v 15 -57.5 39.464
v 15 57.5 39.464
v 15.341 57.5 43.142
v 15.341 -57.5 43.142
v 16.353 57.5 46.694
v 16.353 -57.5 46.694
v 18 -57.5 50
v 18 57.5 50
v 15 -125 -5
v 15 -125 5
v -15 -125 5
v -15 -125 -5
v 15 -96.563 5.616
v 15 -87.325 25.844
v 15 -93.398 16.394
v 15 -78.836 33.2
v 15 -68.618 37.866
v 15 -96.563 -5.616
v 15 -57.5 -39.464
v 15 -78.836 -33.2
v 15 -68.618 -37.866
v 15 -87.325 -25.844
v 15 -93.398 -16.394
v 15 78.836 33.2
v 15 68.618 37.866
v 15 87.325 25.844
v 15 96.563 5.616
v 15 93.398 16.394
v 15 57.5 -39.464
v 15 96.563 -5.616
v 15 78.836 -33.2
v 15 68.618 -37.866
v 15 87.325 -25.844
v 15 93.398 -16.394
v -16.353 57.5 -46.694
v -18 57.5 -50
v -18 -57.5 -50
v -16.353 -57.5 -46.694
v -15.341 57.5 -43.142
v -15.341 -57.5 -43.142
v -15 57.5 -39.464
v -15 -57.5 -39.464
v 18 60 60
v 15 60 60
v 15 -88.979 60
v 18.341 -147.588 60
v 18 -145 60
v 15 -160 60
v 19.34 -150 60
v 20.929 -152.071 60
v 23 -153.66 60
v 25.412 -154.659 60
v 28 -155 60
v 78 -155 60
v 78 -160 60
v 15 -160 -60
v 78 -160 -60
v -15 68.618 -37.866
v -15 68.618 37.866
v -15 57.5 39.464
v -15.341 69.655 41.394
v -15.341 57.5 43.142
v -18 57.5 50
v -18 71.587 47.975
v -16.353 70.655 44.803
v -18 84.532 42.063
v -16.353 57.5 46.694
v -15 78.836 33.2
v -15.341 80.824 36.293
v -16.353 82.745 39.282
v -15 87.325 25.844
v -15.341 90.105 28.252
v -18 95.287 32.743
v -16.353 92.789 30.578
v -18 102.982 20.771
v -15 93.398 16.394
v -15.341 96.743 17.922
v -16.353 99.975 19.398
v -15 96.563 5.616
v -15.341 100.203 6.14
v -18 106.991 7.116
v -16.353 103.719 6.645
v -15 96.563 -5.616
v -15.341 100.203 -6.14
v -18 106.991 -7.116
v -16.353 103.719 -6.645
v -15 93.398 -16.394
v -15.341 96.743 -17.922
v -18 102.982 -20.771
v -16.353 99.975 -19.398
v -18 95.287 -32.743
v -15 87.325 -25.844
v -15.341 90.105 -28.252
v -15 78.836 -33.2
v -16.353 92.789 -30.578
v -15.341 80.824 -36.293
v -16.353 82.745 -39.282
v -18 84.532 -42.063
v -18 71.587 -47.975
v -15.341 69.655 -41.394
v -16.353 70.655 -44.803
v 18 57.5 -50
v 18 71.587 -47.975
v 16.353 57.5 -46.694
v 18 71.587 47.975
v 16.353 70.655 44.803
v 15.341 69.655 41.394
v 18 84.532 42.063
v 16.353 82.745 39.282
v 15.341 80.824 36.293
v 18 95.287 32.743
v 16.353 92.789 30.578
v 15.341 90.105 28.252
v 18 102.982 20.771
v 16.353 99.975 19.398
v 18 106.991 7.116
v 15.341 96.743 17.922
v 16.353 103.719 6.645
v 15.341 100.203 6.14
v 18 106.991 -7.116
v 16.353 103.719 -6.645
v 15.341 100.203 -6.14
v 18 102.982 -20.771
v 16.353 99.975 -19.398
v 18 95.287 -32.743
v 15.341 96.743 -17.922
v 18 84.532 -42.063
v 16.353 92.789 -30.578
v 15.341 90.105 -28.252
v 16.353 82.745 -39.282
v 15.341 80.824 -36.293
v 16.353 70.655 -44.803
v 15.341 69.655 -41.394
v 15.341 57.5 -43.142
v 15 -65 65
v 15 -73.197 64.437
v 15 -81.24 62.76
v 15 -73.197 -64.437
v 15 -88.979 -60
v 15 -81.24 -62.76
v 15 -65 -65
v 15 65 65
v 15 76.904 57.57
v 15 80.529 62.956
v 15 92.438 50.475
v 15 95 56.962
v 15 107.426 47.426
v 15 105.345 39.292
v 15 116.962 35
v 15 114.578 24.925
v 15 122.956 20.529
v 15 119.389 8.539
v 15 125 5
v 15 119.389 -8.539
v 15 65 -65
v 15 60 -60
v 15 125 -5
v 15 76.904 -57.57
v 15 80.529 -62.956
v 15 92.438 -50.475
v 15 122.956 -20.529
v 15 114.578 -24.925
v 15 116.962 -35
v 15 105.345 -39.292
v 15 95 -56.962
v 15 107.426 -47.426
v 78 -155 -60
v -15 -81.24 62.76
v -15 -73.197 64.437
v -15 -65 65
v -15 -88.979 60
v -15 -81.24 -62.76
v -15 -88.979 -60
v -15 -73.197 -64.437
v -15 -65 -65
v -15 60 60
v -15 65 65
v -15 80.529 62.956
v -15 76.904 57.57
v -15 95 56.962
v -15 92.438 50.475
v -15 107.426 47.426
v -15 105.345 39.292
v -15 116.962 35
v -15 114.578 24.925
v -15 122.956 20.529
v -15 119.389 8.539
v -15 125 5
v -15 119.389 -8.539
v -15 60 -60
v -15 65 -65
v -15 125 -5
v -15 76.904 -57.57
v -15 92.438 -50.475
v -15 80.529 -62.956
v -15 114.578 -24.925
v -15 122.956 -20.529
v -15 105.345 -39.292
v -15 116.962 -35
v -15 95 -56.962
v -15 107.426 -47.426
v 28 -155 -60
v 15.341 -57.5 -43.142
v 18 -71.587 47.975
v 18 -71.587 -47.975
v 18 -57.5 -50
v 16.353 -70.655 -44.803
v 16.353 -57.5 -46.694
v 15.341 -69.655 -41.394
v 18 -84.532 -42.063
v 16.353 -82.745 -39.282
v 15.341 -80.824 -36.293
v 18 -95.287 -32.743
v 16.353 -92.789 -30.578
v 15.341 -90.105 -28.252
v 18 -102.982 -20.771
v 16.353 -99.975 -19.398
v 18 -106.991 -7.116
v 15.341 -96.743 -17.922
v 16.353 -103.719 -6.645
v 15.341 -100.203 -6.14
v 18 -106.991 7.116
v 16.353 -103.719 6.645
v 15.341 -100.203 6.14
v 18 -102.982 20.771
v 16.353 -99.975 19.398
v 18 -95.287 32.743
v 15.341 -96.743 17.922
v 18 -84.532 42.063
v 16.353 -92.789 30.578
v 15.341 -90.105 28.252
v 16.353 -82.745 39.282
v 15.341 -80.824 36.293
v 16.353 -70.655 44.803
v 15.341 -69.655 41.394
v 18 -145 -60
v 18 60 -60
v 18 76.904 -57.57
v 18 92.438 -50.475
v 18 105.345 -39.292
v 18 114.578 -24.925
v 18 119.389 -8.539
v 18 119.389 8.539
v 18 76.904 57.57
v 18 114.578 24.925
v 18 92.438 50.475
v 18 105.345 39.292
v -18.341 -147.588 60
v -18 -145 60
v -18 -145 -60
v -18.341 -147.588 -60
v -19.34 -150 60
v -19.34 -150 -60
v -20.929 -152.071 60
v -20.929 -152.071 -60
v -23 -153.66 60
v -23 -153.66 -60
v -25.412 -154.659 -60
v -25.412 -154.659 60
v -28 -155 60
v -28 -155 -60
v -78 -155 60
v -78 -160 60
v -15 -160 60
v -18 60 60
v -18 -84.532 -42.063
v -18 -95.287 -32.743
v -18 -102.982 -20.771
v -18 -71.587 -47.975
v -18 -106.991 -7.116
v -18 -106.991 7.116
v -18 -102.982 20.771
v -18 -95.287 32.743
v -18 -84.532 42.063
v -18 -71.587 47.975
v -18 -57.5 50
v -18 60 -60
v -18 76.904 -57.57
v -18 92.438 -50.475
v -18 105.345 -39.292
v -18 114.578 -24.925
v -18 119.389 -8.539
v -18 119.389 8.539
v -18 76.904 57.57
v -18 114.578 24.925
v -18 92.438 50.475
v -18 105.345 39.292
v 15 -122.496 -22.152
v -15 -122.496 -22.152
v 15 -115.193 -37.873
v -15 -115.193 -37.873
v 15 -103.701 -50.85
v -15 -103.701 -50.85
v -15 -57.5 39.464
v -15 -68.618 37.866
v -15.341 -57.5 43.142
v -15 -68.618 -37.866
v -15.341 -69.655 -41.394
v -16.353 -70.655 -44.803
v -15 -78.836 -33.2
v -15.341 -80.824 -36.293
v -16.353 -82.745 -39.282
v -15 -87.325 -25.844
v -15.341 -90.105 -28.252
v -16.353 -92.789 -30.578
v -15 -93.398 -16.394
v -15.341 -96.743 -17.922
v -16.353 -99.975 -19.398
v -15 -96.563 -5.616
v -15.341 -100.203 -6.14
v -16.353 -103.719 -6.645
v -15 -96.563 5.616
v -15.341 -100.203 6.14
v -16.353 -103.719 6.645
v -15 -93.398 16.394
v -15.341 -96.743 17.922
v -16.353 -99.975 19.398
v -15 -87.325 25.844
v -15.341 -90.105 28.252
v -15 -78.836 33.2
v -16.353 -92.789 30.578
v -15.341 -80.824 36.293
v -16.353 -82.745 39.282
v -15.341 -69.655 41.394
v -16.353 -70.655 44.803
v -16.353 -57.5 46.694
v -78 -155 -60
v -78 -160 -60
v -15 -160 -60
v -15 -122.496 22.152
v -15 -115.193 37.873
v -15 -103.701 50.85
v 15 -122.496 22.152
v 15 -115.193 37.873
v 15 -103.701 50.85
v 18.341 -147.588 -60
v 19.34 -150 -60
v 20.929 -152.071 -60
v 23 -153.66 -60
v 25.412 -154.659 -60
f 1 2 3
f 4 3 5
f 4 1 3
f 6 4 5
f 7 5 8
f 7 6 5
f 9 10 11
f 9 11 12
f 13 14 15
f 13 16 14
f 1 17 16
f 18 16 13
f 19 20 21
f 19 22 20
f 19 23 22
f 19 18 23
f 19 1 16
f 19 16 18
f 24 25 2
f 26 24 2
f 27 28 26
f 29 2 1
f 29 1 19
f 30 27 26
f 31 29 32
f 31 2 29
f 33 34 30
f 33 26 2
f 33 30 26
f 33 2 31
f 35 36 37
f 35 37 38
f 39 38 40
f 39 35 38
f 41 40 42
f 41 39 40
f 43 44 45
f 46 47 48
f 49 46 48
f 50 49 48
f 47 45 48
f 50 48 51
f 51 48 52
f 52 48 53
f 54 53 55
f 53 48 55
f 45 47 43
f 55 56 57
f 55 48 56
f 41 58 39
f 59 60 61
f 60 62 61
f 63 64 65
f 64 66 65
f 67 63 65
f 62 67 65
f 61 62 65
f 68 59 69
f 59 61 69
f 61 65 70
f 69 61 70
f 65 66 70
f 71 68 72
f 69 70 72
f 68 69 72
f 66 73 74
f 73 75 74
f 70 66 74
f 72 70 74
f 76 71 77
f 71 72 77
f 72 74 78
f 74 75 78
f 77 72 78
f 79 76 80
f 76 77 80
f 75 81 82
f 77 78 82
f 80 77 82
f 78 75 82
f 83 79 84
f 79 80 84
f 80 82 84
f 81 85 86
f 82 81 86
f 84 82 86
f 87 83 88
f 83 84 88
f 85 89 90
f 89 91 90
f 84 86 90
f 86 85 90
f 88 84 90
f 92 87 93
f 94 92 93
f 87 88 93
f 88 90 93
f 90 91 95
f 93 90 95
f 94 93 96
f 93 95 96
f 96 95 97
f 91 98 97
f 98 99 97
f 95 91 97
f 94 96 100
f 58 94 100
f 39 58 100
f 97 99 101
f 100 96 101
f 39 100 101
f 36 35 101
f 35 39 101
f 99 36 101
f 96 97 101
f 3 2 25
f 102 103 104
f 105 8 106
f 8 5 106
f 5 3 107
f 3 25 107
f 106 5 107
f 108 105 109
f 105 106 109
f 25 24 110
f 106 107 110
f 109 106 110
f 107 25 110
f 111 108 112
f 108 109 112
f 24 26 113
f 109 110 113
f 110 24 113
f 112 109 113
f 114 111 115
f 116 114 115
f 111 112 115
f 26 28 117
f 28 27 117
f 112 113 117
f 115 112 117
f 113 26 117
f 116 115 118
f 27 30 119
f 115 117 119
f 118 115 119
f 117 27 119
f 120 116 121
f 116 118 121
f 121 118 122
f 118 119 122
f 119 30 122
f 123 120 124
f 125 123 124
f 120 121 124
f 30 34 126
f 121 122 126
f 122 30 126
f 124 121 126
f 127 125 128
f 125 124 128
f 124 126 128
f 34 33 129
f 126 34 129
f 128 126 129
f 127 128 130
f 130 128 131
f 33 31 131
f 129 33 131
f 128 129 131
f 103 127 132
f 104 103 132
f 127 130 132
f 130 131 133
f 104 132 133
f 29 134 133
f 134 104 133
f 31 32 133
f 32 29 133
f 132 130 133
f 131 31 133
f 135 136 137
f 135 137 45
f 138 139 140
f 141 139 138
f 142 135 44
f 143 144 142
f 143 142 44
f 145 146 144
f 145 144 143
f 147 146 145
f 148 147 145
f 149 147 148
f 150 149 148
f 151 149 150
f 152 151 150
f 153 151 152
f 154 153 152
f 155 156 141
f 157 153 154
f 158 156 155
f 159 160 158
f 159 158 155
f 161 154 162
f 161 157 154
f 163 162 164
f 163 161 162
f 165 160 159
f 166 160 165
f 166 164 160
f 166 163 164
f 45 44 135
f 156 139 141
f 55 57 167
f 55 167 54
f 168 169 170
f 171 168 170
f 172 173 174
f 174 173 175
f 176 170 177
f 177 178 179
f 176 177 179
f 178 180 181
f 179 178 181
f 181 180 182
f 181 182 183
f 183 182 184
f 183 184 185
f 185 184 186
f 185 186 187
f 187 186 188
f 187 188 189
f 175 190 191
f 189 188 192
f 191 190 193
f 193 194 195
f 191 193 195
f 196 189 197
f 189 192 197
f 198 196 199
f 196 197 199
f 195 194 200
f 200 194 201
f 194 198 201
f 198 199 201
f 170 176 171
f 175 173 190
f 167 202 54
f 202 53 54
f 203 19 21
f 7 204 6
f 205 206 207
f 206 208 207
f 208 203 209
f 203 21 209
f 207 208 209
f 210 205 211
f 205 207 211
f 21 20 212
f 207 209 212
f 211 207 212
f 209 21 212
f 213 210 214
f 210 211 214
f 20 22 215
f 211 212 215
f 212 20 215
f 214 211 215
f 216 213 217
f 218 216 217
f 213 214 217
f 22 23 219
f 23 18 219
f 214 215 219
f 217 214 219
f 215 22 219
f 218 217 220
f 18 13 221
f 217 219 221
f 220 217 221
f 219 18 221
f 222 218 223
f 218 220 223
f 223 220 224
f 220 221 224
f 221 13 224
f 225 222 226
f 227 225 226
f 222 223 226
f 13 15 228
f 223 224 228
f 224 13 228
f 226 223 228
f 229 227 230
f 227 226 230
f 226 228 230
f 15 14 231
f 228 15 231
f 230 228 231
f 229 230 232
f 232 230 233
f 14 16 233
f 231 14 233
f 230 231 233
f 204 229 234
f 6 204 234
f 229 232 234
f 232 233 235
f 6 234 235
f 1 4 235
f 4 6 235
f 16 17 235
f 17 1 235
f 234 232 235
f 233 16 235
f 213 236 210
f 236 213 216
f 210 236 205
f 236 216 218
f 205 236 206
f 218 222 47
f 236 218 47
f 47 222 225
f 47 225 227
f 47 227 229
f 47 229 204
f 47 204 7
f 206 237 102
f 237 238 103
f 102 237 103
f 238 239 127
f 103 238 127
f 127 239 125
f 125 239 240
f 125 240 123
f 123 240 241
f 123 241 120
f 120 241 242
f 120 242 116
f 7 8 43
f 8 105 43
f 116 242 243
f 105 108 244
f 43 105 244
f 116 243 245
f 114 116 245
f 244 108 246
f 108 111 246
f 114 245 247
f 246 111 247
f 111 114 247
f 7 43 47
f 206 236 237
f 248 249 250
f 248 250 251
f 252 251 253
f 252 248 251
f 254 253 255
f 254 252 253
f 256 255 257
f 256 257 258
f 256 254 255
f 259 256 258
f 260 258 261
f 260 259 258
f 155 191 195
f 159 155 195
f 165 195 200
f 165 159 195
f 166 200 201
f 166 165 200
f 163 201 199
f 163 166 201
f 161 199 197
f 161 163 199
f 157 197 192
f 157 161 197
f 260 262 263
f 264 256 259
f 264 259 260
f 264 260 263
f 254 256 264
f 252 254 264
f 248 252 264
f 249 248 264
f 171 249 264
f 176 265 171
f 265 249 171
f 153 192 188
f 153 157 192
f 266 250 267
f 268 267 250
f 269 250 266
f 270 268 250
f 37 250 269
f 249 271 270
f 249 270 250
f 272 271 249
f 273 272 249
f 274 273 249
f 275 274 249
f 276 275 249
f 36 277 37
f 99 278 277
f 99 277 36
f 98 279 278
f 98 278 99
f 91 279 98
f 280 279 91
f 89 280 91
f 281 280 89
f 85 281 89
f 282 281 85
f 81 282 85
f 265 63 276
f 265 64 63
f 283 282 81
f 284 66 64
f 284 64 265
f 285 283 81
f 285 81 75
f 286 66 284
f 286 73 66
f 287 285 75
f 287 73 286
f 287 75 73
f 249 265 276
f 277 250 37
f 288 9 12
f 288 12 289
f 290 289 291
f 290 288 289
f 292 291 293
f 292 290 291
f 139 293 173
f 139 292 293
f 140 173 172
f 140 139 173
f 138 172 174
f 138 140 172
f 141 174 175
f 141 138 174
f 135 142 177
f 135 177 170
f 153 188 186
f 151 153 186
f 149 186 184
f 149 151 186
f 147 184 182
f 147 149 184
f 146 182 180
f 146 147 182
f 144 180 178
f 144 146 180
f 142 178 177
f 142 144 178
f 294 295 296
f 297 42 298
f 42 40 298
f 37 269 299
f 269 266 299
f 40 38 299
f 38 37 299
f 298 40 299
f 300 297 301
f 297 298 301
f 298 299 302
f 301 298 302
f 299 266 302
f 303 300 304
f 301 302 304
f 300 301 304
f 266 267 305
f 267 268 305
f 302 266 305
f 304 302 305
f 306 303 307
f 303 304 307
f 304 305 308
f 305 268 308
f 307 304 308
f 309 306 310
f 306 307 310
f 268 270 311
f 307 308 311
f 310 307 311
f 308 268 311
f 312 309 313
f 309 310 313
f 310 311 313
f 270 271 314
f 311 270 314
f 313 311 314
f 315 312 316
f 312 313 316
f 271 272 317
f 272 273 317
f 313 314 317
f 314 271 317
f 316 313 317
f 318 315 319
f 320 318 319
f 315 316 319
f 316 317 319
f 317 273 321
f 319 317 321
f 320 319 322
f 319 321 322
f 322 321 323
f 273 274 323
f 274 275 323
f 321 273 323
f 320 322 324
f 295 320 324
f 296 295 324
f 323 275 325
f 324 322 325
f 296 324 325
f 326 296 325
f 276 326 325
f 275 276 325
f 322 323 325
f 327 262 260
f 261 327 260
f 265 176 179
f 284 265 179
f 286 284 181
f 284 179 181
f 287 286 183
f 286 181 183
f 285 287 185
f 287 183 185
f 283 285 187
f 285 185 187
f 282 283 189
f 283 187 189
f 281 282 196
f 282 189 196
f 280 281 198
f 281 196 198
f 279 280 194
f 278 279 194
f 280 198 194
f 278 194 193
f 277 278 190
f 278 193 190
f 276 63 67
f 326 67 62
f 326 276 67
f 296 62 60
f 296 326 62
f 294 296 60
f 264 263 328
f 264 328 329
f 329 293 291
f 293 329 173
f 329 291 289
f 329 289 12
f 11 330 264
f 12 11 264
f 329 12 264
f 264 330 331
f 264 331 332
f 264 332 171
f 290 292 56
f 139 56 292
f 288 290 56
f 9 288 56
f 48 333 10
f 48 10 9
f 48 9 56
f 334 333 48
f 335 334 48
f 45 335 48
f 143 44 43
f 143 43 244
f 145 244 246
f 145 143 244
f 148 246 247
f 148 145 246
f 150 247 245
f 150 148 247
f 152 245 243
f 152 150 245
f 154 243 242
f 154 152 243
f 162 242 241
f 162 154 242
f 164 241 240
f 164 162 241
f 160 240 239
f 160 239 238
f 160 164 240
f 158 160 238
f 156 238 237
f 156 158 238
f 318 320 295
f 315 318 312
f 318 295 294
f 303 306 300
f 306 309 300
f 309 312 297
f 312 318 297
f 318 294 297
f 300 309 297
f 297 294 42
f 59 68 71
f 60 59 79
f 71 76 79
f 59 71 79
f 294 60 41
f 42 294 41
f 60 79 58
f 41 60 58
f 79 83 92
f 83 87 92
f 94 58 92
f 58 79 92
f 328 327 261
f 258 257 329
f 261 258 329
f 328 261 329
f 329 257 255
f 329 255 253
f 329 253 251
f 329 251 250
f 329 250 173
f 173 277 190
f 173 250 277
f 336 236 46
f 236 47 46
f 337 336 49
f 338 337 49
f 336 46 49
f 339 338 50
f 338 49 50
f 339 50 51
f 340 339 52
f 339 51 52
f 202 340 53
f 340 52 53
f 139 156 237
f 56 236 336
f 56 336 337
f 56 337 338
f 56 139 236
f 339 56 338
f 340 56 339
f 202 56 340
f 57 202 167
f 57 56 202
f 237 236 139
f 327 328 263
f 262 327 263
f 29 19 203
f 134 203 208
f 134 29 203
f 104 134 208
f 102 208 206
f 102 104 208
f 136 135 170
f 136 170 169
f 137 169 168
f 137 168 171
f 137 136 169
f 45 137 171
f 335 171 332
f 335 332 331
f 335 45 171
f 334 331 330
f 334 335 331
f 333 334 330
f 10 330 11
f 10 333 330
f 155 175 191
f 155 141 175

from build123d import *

# Parameters (mm, degrees)
BOSS_EXTRUDE1_DEPTH = 15
BOSS_EXTRUDE2_DEPTH = 3
FILLET1_R           = 20
SKETCH4_W           = 60
SKETCH4_H           = 120
BOSS_EXTRUDE3_DEPTH = 5
BOSS_EXTRUDE4_START = -30
BOSS_EXTRUDE4_DEPTH = 3
FILLET2_R           = 20
FILLET4_R           = 10
BOSS_EXTRUDE5_START = -5
BOSS_EXTRUDE5_DEPTH = 120


with BuildPart() as part:
    # Sketch1 → Boss-Extrude1 (new, symmetric)
    with BuildSketch(Plane(origin=(0, 0, 0), x_dir=(0, 0, -1), z_dir=(1, 0, 0))):
        with BuildLine():
            Line((5, 125), (-5, 125))
            ThreePointArc((-5, 125), (-47.426406871, 107.426406871), (-65, 65))
            Line((-65, 65), (-65, -65))
            ThreePointArc((-65, -65), (-47.426406871, -107.426406871), (-5, -125))
            Line((-5, -125), (5, -125))
            ThreePointArc((5, -125), (47.426406871, -107.426406871), (65, -65))
            Line((65, -65), (65, 65))
            ThreePointArc((65, 65), (47.426406871, 107.426406871), (5, 125))
        make_face()
    extrude(amount=BOSS_EXTRUDE1_DEPTH, both=True)

    # Sketch3 → Boss-Extrude2 (add)
    with BuildSketch(Plane(origin=(15, 0, 0), x_dir=(0, 0, -1), z_dir=(1, 0, 0))):
        with BuildLine():
            Line((-60, -60), (-60, 60))
            ThreePointArc((-60, 60), (0, 120), (60, 60))
            Line((60, 60), (60, -60))
            Line((60, -60), (60, -160))
            Line((60, -160), (-60, -160))
            Line((-60, -160), (-60, -60))
        make_face()
        with BuildLine():
            Line((-50, -57.5), (-50, 57.5))
            ThreePointArc((-50, 57.5), (0, 107.5), (50, 57.5))
            Line((50, 57.5), (50, -57.5))
            ThreePointArc((50, -57.5), (0, -107.5), (-50, -57.5))
        make_face(mode=Mode.SUBTRACT)
    extrude(amount=BOSS_EXTRUDE2_DEPTH)

    # Fillet1
    # the kernel refuses this fillet: 20 mm, written as the material it adds along each edge
    with BuildSketch(Plane(origin=(15, 57.5, -50), x_dir=(1, 0, 0), z_dir=(0, -1, 0)), Plane(origin=(15, -57.5, 50), x_dir=(1, 0, 0), z_dir=(0, 1, 0))) as fillet1_piece_1:
        with BuildLine():
            CenterArc((20, 10.535653753), FILLET1_R, 180, 31.788330617)
            Line((0, 10.535653753), (-0.4, 10.535653753))
            Line((-0.4, 10.535653753), (-0.4, 0))
            Line((-0.4, 0), (0, -0.4))
            ThreePointArc((0, -0.4), (1.5, -0.4), (2.66, -0.210713075))
            Line((2.66, -0.210713075), (3, 0))
        make_face()
    extrude(amount=115)
    with BuildSketch(Plane(origin=(15, -57.5, 0), x_dir=(0, 0, -1), z_dir=(0, 1, 0))) as fillet1_piece_2:
        with BuildLine():
            CenterArc((39.464346247, -20), FILLET1_R, 58.211669383, 31.788330617)
            Line((39.464346247, 0), (39.464346247, 0.4))
            Line((39.464346247, 0.4), (50, 0.4))
            Line((50, 0.4), (50.4, 0))
            ThreePointArc((50.4, 0), (50.4, -1.5), (50.210713075, -2.66))
            Line((50.210713075, -2.66), (50, -3))
        make_face()
    revolve(axis=Axis((15, -57.5, 0), (-1, 0, 0)), revolution_arc=180)
    with BuildSketch(Plane(origin=(15, 57.5, 0), x_dir=(0, 0, 1), z_dir=(0, -1, 0))) as fillet1_piece_3:
        with BuildLine():
            CenterArc((39.464346247, -20), FILLET1_R, 58.211669383, 31.788330617)
            Line((39.464346247, 0), (39.464346247, 0.4))
            Line((39.464346247, 0.4), (50, 0.4))
            Line((50, 0.4), (50.4, 0))
            ThreePointArc((50.4, 0), (50.4, -1.5), (50.210713075, -2.66))
            Line((50.210713075, -2.66), (50, -3))
        make_face()
    revolve(axis=Axis((15, 57.5, 0), (-1, 0, 0)), revolution_arc=180)

    # Sketch4 → Boss-Extrude3 (add)
    with BuildSketch(Plane.XZ.offset(160)):
        with Locations((48, 0)):
            Rectangle(SKETCH4_W, SKETCH4_H)
        with Locations((-48, 0)):
            Rectangle(SKETCH4_W, SKETCH4_H)
    extrude(amount=-BOSS_EXTRUDE3_DEPTH)


with BuildPart() as boss_extrude3_piece_1:
    # of the separate pieces the step leaves, piece 1, a body of its own (boss_extrude3_pieces)
    add(part.part.solids().sort_by_distance((18, 57.5, 50))[0])

    # Sketch3<4> → Boss-Extrude4 (add)
    with BuildSketch(Plane(origin=(15, 0, 0), x_dir=(0, 0, -1), z_dir=(1, 0, 0)).offset(BOSS_EXTRUDE4_START)):
        with BuildLine():
            Line((-60, -60), (-60, 60))
            ThreePointArc((-60, 60), (0, 120), (60, 60))
            Line((60, 60), (60, -60))
            Line((60, -60), (60, -160))
            Line((60, -160), (-60, -160))
            Line((-60, -160), (-60, -60))
        make_face()
        with BuildLine():
            Line((-50, -57.5), (-50, 57.5))
            ThreePointArc((-50, 57.5), (0, 107.5), (50, 57.5))
            Line((50, 57.5), (50, -57.5))
            ThreePointArc((50, -57.5), (0, -107.5), (-50, -57.5))
        make_face(mode=Mode.SUBTRACT)
    extrude(amount=-BOSS_EXTRUDE4_DEPTH)

    # Fillet2
    # the kernel refuses this fillet: 20 mm, written as the material it adds along each edge
    with BuildSketch(Plane(origin=(-15, -57.5, 0), x_dir=(0, 0, -1), z_dir=(0, 1, 0))) as fillet2_piece_1:
        with BuildLine():
            CenterArc((39.464346247, 20), FILLET2_R, 270, 31.788330617)
            Line((39.464346247, 0), (39.464346247, -0.4))
            Line((39.464346247, -0.4), (50, -0.4))
            Line((50, -0.4), (50.4, 0))
            ThreePointArc((50.4, 0), (50.4, 1.5), (50.210713075, 2.66))
            Line((50.210713075, 2.66), (50, 3))
        make_face()
    revolve(axis=Axis((-15, -57.5, 0), (-1, 0, 0)), revolution_arc=180)
    with BuildSketch(Plane(origin=(-15, -57.5, 50), x_dir=(-1, 0, 0), z_dir=(0, 1, 0)), Plane(origin=(-15, 57.5, -50), x_dir=(-1, 0, 0), z_dir=(0, -1, 0))) as fillet2_piece_2:
        with BuildLine():
            CenterArc((20, -10.535653753), FILLET2_R, 148.211669383, 31.788330617)
            Line((0, -10.535653753), (-0.4, -10.535653753))
            Line((-0.4, -10.535653753), (-0.4, 0))
            Line((-0.4, 0), (0, 0.4))
            ThreePointArc((0, 0.4), (1.5, 0.4), (2.66, 0.210713075))
            Line((2.66, 0.210713075), (3, 0))
        make_face()
    extrude(amount=115)
    with BuildSketch(Plane(origin=(-15, 57.5, 0), x_dir=(0, 0, 1), z_dir=(0, -1, 0))) as fillet2_piece_3:
        with BuildLine():
            CenterArc((39.464346247, 20), FILLET2_R, 270, 31.788330617)
            Line((39.464346247, 0), (39.464346247, -0.4))
            Line((39.464346247, -0.4), (50, -0.4))
            Line((50, -0.4), (50.4, 0))
            ThreePointArc((50.4, 0), (50.4, 1.5), (50.210713075, 2.66))
            Line((50.210713075, 2.66), (50, 3))
        make_face()
    revolve(axis=Axis((-15, 57.5, 0), (-1, 0, 0)), revolution_arc=180)

    # Fillet4
    fillet4_edges = [boss_extrude3_piece_1.edges().sort_by_distance(p)[0] for p in [
        (18, -155, 0),
    ]]
    fillet(fillet4_edges, radius=FILLET4_R)



with BuildPart() as boss_extrude3_piece_2:
    # of the separate pieces the step leaves, piece 2, a body of its own (boss_extrude3_pieces)
    add(part.part.solids().sort_by_distance((-18, -160, 60))[0])


with BuildPart() as boss_extrude3_piece_1_1:
    add(boss_extrude3_piece_1.part)

    add(boss_extrude3_piece_2.part)  # Boss-Extrude5 merges Boss-Extrude3 piece 2
    # Sketch5 → Boss-Extrude5 (add)
    with BuildSketch(Plane.XY.offset(65).offset(BOSS_EXTRUDE5_START)):
        with BuildLine():
            Line((-28, -155), (-18, -155))
            Line((-18, -155), (-18, -145))
            ThreePointArc((-18, -145), (-20.928932188, -152.071067812), (-28, -155))
        make_face()
    extrude(amount=-BOSS_EXTRUDE5_DEPTH)


solid = boss_extrude3_piece_1_1.part
